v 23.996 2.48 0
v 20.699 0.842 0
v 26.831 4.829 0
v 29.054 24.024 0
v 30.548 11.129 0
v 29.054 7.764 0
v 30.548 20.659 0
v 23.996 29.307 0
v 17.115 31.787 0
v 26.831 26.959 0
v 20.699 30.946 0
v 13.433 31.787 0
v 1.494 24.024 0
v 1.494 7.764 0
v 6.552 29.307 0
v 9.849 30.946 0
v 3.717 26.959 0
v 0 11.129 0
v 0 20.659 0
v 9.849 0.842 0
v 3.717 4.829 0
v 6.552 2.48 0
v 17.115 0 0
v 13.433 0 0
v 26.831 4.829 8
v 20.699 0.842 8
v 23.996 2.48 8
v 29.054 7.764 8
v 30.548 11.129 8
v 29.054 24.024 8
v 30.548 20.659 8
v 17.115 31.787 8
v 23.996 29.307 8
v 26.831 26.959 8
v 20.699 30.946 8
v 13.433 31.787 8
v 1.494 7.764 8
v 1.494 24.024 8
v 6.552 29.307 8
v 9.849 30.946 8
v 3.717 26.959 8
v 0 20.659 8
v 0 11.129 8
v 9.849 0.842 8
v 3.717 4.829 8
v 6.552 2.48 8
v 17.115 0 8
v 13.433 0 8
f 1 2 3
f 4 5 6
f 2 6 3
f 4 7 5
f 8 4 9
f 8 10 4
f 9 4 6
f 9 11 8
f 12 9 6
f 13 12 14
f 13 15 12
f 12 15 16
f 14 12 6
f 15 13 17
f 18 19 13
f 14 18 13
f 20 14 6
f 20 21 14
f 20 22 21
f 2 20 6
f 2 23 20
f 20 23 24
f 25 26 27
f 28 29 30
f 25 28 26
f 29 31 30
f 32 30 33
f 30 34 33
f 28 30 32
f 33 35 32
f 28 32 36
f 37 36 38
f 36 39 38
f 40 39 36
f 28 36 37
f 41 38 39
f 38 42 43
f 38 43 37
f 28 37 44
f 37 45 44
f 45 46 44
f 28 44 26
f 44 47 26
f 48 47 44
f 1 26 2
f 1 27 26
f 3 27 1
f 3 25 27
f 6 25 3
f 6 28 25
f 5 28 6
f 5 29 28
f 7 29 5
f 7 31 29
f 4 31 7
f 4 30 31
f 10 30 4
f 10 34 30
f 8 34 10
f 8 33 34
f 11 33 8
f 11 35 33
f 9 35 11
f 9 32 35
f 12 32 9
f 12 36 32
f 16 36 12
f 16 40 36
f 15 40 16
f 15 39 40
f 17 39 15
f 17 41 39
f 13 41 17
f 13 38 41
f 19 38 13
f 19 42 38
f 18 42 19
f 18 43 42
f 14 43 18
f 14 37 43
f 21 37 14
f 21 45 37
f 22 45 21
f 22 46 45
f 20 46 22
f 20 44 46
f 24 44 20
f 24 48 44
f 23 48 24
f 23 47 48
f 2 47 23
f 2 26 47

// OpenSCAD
$fn = 32;

// ----------------------------------------------------------------------
// Flat adaptor: double_d, 8 mm thick
// ----------------------------------------------------------------------

// --- parameters (mm) ---
profile_height = 8;       // extrusion height
profile_points = 24;      // points of the closed outline

profile = [[30.548, 20.659], [29.054, 24.024], [26.831, 26.959], [23.996, 29.307], [20.699, 30.946], [17.115, 31.787], [13.433, 31.787], [9.849, 30.946], [6.552, 29.307], [3.717, 26.959], [1.494, 24.024], [0, 20.659], [0, 11.129], [1.494, 7.764], [3.717, 4.829], [6.552, 2.48], [9.849, 0.842], [13.433, 0], [17.115, 0], [20.699, 0.842], [23.996, 2.48], [26.831, 4.829], [29.054, 7.764], [30.548, 11.129]];  // single closed polygon, 24 points, counter clockwise

// --- the one profile operation ---
linear_extrude(height = profile_height) polygon(points = profile);
